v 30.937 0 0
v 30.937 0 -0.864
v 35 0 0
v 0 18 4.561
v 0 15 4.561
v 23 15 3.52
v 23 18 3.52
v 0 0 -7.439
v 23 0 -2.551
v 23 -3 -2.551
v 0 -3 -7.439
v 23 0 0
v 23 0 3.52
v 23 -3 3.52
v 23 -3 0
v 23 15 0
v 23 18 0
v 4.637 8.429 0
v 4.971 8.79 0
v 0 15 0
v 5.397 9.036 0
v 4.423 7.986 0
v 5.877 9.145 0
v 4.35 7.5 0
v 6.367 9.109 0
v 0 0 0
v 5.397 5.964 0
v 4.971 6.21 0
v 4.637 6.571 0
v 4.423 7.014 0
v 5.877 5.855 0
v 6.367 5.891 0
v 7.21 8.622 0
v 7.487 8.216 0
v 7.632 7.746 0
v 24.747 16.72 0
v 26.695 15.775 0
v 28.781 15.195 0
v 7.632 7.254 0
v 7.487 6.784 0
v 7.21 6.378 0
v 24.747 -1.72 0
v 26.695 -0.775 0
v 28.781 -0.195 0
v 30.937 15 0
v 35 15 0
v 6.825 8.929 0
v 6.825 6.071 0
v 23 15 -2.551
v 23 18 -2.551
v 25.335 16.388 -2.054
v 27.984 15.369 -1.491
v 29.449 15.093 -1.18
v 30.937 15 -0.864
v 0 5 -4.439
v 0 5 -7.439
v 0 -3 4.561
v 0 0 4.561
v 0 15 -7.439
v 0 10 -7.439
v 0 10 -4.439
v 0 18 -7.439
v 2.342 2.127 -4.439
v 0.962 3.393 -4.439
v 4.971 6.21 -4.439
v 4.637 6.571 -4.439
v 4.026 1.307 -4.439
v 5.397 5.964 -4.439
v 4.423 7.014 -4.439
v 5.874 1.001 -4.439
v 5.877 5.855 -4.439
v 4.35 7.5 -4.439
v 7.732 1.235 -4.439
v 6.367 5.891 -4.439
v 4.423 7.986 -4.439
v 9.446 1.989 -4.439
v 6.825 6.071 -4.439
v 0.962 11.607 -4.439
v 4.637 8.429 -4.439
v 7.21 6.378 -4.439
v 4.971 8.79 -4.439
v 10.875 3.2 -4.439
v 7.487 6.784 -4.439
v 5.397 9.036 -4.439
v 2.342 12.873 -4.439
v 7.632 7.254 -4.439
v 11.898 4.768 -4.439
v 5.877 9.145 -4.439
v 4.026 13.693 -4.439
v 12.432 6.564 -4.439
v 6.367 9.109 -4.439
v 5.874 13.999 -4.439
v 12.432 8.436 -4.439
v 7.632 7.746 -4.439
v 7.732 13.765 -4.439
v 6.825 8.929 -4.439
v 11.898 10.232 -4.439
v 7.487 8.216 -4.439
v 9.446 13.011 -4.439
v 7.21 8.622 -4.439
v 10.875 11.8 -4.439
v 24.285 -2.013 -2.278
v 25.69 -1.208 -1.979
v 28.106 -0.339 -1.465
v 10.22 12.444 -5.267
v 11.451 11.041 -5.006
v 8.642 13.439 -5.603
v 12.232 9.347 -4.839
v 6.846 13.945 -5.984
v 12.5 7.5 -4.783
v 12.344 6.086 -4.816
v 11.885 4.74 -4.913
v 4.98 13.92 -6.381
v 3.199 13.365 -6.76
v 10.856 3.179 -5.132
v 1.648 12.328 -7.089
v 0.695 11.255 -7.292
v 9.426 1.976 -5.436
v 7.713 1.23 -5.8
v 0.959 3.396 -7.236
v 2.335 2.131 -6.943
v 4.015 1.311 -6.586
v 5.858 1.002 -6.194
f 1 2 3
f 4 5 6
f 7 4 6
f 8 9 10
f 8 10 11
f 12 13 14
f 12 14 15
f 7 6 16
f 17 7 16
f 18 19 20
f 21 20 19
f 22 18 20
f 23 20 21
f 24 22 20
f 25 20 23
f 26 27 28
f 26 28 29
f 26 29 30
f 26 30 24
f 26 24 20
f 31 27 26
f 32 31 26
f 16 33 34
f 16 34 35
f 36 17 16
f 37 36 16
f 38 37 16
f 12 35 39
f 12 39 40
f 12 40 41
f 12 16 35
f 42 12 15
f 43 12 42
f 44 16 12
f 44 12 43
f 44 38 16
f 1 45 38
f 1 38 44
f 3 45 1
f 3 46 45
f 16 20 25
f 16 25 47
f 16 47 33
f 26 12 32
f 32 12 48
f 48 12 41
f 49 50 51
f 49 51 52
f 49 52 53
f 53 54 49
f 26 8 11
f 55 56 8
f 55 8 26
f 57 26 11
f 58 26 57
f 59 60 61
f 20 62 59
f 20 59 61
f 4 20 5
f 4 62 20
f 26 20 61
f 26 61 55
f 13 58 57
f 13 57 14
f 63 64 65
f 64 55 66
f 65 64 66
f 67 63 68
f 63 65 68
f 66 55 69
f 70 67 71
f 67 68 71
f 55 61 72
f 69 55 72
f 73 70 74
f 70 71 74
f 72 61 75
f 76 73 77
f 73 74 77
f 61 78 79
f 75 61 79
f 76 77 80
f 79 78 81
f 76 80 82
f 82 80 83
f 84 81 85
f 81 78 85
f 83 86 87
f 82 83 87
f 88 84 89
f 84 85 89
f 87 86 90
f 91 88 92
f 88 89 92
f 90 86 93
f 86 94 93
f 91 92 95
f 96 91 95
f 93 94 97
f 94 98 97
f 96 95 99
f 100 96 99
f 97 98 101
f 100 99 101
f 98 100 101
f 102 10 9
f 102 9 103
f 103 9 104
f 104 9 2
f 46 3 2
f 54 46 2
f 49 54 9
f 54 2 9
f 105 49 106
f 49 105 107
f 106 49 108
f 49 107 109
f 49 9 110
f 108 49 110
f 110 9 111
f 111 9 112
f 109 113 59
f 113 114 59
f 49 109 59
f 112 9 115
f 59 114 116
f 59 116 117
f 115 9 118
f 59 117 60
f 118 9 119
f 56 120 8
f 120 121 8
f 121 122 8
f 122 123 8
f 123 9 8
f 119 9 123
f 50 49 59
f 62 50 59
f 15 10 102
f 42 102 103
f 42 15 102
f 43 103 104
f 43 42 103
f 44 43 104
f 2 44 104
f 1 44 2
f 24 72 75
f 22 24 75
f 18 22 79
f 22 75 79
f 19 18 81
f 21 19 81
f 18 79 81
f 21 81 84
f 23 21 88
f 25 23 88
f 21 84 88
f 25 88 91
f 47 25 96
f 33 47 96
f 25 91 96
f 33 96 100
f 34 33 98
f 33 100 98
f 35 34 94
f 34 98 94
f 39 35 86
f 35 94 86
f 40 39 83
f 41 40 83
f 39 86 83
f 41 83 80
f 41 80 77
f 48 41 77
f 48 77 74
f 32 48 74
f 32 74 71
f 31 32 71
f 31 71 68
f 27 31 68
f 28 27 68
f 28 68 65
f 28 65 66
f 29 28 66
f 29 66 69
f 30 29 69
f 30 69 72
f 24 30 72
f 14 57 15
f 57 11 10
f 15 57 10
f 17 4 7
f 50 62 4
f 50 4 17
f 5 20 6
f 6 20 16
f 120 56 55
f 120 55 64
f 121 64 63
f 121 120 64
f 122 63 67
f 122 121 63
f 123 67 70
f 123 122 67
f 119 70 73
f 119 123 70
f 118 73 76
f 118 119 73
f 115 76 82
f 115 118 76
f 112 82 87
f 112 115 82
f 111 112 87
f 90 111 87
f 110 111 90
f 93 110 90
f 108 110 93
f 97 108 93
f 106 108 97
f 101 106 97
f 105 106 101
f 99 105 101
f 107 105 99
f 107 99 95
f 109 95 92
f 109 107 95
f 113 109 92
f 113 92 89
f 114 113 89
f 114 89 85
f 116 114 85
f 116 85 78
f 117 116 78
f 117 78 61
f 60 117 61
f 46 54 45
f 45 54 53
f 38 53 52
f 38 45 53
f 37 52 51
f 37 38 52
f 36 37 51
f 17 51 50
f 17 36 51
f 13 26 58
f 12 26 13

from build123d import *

# Parameters (mm, degrees)
EXTRUDE_1_DEPTH     = 15
SKETCH_3_R          = 6.5
CUT_EXTRUDE_2_DEPTH = 3
SKETCH_4_R          = 1.65
CUT_EXTRUDE_3_DEPTH = 39.336783637
EXTRUDE_2_DEPTH     = 3
FILLET_1_R          = 12


with BuildPart() as part:
    # 草图2 → 凸台-拉伸1 (new body)
    with BuildSketch(Plane(origin=(0, 0, 0), x_dir=(1, 0, 0), z_dir=(0, 1, 0))):
        Polygon((0, 0), (35, 0), (0, 7.439479658), align=None)
    extrude(amount=EXTRUDE_1_DEPTH)

    # 草图3 → 切除-拉伸2 (cut)
    with BuildSketch(Plane.XY.offset(-7.439479658)):
        with Locations((6, 7.5)):
            Circle(SKETCH_3_R)
    extrude(amount=CUT_EXTRUDE_2_DEPTH, mode=Mode.SUBTRACT)

    # 草图4 → 切除-拉伸3 (cut, through all)
    with BuildSketch(Plane(origin=(0, 0, -4.439479658), x_dir=(-1, 0, 0), z_dir=(0, 0, -1))):
        with Locations((-6, 7.5)):
            Circle(SKETCH_4_R)
    extrude(amount=-CUT_EXTRUDE_3_DEPTH, mode=Mode.SUBTRACT)

    # 草图6 → 凸台-拉伸2 (add)
    with BuildSketch(Plane(origin=(0, 15, 0), x_dir=(1, 0, 0), z_dir=(0, 1, 0))):
        Polygon((0, 7.439479658), (0, -4.560520342), (23, -3.520495202), (23, 2.55067874), align=None)
    extrude_2 = extrude(amount=EXTRUDE_2_DEPTH)

    # 镜向1: 凸台-拉伸2 across plane
    add(extrude_2.mirror(Plane(origin=(0, 7.5, 0), x_dir=(0, 0, 1), z_dir=(0, -1, 0))))

    # 圆角1
    # the kernel refuses this fillet: 12 mm, written as the material it adds along each edge
    with BuildSketch(Plane(origin=(23, 0, 0), x_dir=(0, -1, 0), z_dir=(0, 0, -1))) as fillet_1_piece_1_section:
        with BuildLine():
            CenterArc((12, -7.937253933), FILLET_1_R, 138.590377891, 41.409622109)
            Line((0, -7.937253933), (0, 0))
            Line((0, 0), (3, 0))
        make_face()
    fillet_1_piece_1 = extrude(amount=22.393813573, mode=Mode.PRIVATE)
    fillet_1_piece_1 = split(fillet_1_piece_1, bisect_by=Plane(origin=(26.786150339, -0.752577895, -1.745907642), z_dir=(-0.20791169081775981, 0, 0.9781476007338056)), keep=Keep.TOP, mode=Mode.PRIVATE)
    add(fillet_1_piece_1)
    with BuildSketch(Plane(origin=(23, 15, 0), x_dir=(0, 1, 0), z_dir=(0, 0, -1))) as fillet_1_piece_2_section:
        with BuildLine():
            CenterArc((12, 7.937253933), FILLET_1_R, 180, 41.409622109)
            Line((0, 7.937253933), (0, 0))
            Line((0, 0), (3, 0))
        make_face()
    fillet_1_piece_2 = extrude(amount=22.393813573, mode=Mode.PRIVATE)
    fillet_1_piece_2 = split(fillet_1_piece_2, bisect_by=Plane(origin=(26.786150339, 15.752577895, -1.745907642), z_dir=(-0.20791169081775981, 0, 0.9781476007338056)), keep=Keep.TOP, mode=Mode.PRIVATE)
    add(fillet_1_piece_2)


solid = part.part
